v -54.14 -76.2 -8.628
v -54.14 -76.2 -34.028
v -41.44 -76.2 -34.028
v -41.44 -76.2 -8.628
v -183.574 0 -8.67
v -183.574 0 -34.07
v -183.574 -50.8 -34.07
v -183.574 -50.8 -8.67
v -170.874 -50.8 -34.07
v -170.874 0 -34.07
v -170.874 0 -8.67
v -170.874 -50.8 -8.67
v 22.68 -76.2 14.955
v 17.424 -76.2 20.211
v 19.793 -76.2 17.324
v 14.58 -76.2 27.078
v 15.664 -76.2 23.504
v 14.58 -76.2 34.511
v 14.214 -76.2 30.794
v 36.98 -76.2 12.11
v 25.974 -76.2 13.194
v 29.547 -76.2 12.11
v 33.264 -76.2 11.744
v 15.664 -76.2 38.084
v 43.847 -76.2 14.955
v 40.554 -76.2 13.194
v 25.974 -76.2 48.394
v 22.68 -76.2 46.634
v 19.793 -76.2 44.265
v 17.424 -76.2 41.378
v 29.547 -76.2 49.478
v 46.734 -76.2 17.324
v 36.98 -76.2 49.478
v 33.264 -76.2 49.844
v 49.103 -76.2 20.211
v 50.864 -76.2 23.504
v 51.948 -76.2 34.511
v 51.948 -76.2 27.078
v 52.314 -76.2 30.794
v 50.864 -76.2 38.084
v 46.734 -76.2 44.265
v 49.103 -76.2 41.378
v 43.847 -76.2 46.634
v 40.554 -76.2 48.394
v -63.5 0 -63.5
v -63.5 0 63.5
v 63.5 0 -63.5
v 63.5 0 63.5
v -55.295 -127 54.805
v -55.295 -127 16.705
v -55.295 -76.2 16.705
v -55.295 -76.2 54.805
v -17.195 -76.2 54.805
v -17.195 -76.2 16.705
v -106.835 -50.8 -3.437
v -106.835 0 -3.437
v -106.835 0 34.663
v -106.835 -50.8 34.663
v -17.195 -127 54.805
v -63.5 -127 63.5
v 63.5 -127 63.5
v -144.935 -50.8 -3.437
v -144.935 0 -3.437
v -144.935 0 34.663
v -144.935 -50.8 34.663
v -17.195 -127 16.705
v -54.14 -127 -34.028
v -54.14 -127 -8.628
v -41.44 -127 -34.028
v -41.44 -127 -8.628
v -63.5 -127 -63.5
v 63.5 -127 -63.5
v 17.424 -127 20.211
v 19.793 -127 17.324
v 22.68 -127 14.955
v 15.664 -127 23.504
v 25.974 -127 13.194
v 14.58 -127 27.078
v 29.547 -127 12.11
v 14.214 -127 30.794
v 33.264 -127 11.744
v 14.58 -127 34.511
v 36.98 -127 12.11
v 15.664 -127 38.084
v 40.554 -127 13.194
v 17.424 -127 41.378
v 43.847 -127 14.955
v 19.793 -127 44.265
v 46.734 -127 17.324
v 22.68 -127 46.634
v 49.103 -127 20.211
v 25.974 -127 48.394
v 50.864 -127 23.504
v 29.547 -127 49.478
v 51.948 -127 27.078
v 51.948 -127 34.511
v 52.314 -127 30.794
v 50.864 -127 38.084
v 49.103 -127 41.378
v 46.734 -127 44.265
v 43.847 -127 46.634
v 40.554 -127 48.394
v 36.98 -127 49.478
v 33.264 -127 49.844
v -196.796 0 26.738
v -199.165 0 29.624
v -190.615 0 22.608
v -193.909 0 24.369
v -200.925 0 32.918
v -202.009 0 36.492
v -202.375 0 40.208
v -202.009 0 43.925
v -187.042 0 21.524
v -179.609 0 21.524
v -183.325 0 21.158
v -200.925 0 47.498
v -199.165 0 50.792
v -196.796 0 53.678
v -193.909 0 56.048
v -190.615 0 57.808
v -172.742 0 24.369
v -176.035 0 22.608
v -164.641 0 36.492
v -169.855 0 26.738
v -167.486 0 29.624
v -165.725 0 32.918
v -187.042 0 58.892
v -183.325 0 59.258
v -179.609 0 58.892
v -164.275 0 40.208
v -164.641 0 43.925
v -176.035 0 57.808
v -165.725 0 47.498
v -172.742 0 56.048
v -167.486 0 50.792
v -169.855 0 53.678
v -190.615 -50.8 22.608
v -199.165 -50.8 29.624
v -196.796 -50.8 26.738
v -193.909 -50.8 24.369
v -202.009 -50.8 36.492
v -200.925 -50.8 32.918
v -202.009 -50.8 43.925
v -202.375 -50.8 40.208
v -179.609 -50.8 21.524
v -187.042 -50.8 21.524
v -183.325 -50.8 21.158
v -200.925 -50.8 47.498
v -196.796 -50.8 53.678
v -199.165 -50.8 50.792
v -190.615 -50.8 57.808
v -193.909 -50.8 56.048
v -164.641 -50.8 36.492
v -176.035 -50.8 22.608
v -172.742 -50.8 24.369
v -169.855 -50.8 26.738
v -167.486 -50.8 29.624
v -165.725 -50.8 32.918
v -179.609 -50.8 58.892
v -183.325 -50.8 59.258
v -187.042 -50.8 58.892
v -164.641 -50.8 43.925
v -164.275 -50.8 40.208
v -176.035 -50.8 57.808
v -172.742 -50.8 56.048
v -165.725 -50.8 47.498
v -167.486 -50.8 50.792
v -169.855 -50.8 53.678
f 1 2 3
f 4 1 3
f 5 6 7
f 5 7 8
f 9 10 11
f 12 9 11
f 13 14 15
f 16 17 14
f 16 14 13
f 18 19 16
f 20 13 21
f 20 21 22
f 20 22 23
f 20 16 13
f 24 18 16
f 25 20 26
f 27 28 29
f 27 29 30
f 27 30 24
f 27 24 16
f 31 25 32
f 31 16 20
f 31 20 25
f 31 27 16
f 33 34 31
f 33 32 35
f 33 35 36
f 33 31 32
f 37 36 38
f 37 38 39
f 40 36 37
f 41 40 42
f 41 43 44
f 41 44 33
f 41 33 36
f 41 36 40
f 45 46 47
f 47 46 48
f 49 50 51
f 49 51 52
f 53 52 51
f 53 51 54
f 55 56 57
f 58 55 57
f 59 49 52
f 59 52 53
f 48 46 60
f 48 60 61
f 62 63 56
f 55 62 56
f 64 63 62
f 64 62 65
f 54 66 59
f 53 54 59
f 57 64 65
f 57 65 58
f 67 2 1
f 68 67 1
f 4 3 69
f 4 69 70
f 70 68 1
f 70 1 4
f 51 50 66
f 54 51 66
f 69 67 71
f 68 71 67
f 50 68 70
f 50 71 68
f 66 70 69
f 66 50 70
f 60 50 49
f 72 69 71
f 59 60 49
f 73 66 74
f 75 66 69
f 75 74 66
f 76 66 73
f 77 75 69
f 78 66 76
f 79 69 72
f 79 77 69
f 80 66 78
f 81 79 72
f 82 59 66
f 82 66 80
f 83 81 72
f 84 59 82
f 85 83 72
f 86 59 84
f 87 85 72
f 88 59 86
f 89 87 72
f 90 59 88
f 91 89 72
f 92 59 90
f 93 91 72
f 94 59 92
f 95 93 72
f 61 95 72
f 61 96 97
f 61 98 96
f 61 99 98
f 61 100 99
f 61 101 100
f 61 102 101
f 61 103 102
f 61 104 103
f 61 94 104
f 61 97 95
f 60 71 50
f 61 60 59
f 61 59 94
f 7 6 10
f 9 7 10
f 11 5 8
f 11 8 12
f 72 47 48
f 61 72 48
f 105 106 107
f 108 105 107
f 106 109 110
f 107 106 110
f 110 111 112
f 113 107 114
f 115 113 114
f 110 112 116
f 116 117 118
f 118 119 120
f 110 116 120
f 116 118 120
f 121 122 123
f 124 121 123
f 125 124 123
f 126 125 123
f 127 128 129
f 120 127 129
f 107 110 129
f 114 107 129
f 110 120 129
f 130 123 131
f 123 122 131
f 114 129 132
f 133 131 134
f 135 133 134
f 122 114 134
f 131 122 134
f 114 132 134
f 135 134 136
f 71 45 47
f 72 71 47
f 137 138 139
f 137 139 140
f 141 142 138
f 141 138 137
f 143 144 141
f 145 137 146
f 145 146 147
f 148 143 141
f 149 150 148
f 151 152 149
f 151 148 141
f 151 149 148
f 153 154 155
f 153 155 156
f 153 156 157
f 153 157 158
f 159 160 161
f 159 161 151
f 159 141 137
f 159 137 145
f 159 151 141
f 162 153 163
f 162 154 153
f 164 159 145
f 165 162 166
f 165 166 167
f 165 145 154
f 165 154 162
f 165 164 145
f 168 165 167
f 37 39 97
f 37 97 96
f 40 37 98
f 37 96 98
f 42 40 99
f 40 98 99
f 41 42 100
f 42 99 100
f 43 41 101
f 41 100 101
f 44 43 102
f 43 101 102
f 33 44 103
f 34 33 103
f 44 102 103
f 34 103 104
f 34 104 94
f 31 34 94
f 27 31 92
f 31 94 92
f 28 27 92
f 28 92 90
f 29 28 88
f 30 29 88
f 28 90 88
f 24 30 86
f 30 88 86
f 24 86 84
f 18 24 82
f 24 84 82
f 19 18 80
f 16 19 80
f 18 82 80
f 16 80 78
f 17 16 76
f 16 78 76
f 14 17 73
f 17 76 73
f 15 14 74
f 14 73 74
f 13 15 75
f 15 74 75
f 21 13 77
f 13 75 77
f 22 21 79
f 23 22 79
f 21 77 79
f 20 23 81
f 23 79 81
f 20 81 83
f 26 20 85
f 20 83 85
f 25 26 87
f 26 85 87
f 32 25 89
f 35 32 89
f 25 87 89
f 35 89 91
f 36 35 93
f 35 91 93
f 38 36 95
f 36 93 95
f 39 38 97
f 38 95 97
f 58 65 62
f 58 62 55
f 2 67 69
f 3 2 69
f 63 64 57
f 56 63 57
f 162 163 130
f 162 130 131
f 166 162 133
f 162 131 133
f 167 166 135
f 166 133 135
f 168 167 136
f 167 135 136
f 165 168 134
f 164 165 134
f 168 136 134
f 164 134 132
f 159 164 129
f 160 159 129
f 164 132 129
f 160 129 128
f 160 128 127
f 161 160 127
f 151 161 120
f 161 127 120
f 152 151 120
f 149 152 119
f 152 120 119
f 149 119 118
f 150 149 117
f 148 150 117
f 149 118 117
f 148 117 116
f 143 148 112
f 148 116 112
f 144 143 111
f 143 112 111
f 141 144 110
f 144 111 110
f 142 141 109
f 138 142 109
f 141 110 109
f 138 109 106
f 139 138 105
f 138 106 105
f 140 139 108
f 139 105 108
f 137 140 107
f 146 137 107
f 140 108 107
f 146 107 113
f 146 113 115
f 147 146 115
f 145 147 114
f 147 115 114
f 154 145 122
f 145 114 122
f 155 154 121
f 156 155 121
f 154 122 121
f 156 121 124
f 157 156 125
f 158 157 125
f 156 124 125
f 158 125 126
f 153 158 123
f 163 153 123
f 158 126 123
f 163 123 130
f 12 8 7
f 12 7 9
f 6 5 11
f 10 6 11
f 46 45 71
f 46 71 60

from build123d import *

# Parameters (mm, degrees)
F0_W      = 127
F0_H      = 127
F1_DEPTH  = 127
F2_W      = 38.1
F2_H      = 38.1
F3_DEPTH  = 50.8
F4_R      = 19.05
F5_DEPTH  = 50.8
F6_W      = 12.7
F6_H      = 25.4
F7_DEPTH  = 50.8
F8_W      = 38.1
F8_H      = 38.1
F5_FACE_R = 19.05
F9_DEPTH  = 50.8
F10_DEPTH = 50.8
F11_R     = 19.05
F12_DEPTH = 50.8
F13_W     = 12.7
F13_H     = 25.4
F14_DEPTH = 50.8


with BuildPart() as f1:
    # F0 (on Front) → F1 (new body)
    with BuildSketch(Plane.XZ):
        Rectangle(F0_W, F0_H)
    extrude(amount=F1_DEPTH)

    # F2 (on face) → F3 (cut)
    with BuildSketch(Plane.XZ.offset(127)):
        with Locations((-36.2448990345, 35.754707144)):
            Rectangle(F2_W, F2_H)
    extrude(amount=-F3_DEPTH, mode=Mode.SUBTRACT)

    # F4 (on face) → F5 (cut)
    with BuildSketch(Plane.XZ.offset(127)):
        with Locations((33.2637727261, 30.794300139)):
            Circle(F4_R)
    extrude(amount=-F5_DEPTH, mode=Mode.SUBTRACT)

    # F6 (on face) → F7 (cut)
    with BuildSketch(Plane.XZ.offset(127)):
        with Locations((-47.789681504, -21.3277824223)):
            Rectangle(F6_W, F6_H)
    extrude(amount=-F7_DEPTH, mode=Mode.SUBTRACT)


with BuildPart() as f9:
    # F8 (on Front) + F5_face (on face) → F9 (new body)
    with BuildSketch(Plane.XZ):
        with Locations((-125.88457973, 15.6128162026)):
            Rectangle(F8_W, F8_H)
    with BuildSketch(Plane(origin=(33.2637727261, -76.2, 30.794300139), x_dir=(1, 0, 0), z_dir=(0, -1, 0))):
        Circle(F5_FACE_R)
    extrude(amount=F9_DEPTH)

    # F10 (cut): a face of the model
    f10_faces = [f9.faces().sort_by_distance(p)[0] for p in [
        (33.2637727261, -127, 30.794300139),
    ]]
    extrude(f10_faces, amount=-F10_DEPTH, mode=Mode.SUBTRACT)


with BuildPart() as f12:
    # F11 (on Front) → F12 (new body)
    with BuildSketch(Plane.XZ):
        with Locations((-183.3253204823, 40.2080565691)):
            Circle(F11_R)
    extrude(amount=F12_DEPTH)


with BuildPart() as f14:
    # F13 (on Front) → F14 (new body)
    with BuildSketch(Plane.XZ):
        with Locations((-177.2235408425, -21.3700703451)):
            Rectangle(F13_W, F13_H)
    extrude(amount=F14_DEPTH)


solid = Compound([f1.part, f9.part, f12.part, f14.part])
